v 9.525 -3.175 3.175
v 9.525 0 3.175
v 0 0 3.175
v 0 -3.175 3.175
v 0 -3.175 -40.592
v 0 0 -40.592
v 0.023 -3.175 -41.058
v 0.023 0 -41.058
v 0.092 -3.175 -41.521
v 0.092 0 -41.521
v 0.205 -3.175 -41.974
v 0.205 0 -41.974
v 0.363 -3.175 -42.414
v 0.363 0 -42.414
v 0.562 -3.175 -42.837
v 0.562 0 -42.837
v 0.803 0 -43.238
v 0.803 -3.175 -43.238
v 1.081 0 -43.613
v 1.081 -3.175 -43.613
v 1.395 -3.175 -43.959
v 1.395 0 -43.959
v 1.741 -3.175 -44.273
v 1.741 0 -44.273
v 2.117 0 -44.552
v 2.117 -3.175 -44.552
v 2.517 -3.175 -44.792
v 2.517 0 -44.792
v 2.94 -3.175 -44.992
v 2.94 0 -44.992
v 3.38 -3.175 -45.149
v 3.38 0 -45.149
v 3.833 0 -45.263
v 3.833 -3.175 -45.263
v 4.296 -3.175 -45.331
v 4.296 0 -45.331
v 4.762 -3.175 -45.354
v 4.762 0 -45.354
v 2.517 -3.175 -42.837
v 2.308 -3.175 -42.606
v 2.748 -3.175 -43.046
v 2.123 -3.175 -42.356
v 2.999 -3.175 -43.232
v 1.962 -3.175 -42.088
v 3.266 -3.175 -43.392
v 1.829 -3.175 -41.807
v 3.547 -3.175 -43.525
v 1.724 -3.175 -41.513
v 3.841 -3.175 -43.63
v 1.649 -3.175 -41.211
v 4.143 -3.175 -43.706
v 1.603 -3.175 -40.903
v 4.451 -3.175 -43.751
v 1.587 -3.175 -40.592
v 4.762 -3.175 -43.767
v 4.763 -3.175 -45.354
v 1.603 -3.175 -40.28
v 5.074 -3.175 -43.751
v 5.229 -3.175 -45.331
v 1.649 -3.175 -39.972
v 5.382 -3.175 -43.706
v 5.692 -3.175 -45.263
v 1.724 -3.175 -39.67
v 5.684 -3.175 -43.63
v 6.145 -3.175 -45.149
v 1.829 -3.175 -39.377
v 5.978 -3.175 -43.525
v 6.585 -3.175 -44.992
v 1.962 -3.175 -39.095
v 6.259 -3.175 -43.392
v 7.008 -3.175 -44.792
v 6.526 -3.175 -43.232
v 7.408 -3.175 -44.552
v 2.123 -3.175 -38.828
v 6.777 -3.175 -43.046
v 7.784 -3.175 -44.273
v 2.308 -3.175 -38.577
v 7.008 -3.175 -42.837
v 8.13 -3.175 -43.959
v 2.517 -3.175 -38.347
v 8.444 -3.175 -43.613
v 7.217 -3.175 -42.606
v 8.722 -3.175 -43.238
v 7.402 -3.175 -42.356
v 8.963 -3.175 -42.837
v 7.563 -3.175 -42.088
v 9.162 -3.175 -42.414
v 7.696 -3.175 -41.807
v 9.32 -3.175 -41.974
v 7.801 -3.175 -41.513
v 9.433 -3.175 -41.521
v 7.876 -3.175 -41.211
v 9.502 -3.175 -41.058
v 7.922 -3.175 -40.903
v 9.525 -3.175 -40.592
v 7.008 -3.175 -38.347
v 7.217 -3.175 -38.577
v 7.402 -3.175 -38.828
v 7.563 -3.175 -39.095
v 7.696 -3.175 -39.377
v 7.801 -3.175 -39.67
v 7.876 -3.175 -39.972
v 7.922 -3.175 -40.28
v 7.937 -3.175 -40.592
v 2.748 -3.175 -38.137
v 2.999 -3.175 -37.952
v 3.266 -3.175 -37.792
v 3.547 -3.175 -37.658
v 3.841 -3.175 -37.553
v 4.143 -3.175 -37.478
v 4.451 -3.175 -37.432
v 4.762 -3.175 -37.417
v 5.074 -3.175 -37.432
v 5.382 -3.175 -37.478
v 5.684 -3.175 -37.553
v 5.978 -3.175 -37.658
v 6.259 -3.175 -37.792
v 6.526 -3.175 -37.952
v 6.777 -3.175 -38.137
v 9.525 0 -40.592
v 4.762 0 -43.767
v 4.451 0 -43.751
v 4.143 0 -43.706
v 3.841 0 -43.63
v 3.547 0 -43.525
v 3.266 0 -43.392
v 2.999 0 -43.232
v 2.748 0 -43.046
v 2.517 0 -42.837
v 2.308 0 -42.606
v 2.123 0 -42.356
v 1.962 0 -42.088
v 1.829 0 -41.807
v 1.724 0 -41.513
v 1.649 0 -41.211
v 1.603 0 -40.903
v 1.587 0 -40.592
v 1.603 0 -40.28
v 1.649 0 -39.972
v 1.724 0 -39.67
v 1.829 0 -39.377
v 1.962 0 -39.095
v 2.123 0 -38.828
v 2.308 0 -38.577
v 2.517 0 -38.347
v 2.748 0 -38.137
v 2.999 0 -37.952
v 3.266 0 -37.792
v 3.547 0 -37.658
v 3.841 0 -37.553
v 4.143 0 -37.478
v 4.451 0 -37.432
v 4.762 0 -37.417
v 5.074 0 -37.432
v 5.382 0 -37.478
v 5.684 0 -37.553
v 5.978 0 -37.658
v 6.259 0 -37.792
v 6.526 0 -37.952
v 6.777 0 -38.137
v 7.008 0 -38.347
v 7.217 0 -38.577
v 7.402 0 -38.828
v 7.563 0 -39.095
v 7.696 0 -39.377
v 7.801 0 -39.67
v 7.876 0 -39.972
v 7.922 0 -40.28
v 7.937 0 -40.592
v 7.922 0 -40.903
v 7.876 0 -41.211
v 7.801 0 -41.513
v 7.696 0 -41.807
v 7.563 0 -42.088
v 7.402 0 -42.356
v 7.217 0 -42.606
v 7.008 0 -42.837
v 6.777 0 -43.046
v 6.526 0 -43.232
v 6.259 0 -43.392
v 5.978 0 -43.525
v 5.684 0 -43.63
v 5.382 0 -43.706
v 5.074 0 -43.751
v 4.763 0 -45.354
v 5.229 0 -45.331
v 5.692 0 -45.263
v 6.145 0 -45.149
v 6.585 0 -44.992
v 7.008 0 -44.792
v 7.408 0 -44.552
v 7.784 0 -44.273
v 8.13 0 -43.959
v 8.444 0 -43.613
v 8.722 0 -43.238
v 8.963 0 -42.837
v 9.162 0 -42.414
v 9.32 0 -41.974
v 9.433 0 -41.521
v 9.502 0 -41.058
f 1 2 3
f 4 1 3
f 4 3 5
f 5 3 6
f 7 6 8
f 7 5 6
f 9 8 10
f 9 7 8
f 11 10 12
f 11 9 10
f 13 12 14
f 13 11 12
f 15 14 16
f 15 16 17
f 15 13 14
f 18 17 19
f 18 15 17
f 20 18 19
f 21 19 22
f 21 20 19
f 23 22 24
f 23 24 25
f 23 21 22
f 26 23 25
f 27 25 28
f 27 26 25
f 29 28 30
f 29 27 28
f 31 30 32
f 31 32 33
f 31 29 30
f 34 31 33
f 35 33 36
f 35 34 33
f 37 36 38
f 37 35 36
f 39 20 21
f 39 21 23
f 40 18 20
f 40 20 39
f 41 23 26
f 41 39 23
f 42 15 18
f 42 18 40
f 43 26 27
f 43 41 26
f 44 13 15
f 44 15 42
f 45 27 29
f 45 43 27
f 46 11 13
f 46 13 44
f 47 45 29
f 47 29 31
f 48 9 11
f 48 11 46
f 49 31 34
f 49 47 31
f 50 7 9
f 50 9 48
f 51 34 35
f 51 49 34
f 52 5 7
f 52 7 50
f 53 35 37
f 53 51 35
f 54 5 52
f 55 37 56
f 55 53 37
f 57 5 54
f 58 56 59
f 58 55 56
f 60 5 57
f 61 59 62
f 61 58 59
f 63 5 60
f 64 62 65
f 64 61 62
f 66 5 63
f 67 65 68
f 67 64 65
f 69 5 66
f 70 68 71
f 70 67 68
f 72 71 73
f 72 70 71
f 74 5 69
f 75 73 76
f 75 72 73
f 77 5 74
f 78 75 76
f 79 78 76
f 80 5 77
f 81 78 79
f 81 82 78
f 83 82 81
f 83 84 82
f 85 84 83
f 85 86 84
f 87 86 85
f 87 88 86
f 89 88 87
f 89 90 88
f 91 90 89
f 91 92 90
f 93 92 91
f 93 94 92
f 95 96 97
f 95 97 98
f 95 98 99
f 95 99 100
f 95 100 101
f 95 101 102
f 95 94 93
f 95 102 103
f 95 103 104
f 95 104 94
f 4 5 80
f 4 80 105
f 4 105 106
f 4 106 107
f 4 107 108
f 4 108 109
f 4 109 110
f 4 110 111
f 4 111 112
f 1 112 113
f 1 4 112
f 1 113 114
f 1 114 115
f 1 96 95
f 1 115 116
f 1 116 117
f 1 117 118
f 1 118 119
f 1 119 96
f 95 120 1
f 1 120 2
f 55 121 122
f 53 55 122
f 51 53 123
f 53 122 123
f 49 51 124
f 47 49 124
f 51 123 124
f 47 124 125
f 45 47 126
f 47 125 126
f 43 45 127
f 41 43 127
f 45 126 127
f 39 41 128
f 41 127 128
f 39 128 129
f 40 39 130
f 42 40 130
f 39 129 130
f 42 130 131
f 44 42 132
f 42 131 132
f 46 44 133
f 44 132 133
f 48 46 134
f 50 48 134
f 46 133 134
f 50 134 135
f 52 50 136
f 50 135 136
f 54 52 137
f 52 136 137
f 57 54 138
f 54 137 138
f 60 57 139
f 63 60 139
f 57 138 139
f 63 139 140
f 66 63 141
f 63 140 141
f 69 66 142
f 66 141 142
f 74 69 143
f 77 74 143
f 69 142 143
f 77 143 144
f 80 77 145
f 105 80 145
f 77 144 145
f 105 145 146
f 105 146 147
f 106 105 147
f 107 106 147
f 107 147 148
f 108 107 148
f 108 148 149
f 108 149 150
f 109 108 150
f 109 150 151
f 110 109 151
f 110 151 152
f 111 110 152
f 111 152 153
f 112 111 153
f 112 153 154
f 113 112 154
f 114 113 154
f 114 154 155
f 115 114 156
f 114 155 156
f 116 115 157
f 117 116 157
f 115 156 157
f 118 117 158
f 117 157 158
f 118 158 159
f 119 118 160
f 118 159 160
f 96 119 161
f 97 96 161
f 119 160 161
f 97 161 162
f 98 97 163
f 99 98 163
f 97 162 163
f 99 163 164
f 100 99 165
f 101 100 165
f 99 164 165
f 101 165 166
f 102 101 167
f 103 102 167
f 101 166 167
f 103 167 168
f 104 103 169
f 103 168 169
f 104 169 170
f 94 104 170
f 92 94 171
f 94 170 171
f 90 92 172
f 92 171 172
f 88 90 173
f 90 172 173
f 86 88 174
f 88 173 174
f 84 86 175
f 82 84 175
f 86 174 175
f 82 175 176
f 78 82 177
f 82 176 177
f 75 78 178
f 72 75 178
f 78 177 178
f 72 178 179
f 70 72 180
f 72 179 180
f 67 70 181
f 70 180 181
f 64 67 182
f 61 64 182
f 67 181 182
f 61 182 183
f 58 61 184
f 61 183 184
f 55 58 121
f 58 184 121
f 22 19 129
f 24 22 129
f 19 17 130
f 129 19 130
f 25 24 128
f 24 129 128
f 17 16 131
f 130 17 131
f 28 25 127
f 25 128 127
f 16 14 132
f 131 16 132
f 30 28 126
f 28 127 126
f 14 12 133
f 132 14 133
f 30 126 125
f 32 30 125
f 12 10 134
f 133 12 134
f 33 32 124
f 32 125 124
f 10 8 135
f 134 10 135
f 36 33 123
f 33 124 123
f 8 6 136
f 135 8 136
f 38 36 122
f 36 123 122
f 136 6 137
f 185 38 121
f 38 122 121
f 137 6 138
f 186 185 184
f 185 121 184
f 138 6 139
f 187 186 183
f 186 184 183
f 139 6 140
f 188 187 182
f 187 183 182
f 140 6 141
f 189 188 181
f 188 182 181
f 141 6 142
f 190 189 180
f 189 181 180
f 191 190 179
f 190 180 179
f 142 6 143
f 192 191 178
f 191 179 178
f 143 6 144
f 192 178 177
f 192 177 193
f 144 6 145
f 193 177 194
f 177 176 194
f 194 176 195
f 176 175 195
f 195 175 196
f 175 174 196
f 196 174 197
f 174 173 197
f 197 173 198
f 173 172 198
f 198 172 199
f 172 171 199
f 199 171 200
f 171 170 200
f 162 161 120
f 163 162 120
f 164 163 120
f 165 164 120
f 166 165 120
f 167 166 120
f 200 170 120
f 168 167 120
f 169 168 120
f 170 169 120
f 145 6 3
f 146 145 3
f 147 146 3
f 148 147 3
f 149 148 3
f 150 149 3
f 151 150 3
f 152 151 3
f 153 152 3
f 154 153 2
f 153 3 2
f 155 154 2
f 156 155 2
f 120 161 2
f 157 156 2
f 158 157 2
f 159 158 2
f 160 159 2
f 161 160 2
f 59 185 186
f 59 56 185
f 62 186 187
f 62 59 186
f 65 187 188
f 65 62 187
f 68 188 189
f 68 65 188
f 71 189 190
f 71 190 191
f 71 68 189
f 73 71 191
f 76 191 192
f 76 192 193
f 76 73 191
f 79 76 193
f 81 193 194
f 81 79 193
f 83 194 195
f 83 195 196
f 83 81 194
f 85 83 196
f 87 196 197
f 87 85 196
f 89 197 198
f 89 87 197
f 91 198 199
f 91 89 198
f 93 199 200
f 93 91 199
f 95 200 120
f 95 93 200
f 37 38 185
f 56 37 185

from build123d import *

# Parameters (mm, degrees)
F1_DEPTH = 3.175
F2_R     = 4.76249


# Not quite as in the source:
# - a fillet or chamfer is up to 0.001 mm smaller than in the source, because OpenCascade refuses the exact size


with BuildPart() as f1:
    # F0 (on Front) → F1 (new body)
    with BuildSketch(Plane.XZ):
        Polygon((0, 3.175), (0, 0), (0, -45.3541763127), (4.7625, -45.3541763127), (9.525, -45.3541763127), (9.525, 3.175), align=None)
        with BuildLine():
            ThreePointArc((7.9375, -40.5916763127), (7.0075640303, -42.836740343), (4.7625, -43.7666763127))
            ThreePointArc((4.7625, -43.7666763127), (2.5174359697, -38.3466122824), (7.9375, -40.5916763127))
        make_face(mode=Mode.SUBTRACT)
    extrude(amount=F1_DEPTH)

    # F2 (radius 4.7625 in the source; OpenCascade refuses exactly that, so slightly less here)
    f2_edges = [f1.edges().sort_by_distance(p)[0] for p in [
        (0, -1.5875, -45.354176),
        (9.525, -1.5875, -45.354176),
    ]]
    fillet(f2_edges, radius=F2_R)


solid = f1.part
